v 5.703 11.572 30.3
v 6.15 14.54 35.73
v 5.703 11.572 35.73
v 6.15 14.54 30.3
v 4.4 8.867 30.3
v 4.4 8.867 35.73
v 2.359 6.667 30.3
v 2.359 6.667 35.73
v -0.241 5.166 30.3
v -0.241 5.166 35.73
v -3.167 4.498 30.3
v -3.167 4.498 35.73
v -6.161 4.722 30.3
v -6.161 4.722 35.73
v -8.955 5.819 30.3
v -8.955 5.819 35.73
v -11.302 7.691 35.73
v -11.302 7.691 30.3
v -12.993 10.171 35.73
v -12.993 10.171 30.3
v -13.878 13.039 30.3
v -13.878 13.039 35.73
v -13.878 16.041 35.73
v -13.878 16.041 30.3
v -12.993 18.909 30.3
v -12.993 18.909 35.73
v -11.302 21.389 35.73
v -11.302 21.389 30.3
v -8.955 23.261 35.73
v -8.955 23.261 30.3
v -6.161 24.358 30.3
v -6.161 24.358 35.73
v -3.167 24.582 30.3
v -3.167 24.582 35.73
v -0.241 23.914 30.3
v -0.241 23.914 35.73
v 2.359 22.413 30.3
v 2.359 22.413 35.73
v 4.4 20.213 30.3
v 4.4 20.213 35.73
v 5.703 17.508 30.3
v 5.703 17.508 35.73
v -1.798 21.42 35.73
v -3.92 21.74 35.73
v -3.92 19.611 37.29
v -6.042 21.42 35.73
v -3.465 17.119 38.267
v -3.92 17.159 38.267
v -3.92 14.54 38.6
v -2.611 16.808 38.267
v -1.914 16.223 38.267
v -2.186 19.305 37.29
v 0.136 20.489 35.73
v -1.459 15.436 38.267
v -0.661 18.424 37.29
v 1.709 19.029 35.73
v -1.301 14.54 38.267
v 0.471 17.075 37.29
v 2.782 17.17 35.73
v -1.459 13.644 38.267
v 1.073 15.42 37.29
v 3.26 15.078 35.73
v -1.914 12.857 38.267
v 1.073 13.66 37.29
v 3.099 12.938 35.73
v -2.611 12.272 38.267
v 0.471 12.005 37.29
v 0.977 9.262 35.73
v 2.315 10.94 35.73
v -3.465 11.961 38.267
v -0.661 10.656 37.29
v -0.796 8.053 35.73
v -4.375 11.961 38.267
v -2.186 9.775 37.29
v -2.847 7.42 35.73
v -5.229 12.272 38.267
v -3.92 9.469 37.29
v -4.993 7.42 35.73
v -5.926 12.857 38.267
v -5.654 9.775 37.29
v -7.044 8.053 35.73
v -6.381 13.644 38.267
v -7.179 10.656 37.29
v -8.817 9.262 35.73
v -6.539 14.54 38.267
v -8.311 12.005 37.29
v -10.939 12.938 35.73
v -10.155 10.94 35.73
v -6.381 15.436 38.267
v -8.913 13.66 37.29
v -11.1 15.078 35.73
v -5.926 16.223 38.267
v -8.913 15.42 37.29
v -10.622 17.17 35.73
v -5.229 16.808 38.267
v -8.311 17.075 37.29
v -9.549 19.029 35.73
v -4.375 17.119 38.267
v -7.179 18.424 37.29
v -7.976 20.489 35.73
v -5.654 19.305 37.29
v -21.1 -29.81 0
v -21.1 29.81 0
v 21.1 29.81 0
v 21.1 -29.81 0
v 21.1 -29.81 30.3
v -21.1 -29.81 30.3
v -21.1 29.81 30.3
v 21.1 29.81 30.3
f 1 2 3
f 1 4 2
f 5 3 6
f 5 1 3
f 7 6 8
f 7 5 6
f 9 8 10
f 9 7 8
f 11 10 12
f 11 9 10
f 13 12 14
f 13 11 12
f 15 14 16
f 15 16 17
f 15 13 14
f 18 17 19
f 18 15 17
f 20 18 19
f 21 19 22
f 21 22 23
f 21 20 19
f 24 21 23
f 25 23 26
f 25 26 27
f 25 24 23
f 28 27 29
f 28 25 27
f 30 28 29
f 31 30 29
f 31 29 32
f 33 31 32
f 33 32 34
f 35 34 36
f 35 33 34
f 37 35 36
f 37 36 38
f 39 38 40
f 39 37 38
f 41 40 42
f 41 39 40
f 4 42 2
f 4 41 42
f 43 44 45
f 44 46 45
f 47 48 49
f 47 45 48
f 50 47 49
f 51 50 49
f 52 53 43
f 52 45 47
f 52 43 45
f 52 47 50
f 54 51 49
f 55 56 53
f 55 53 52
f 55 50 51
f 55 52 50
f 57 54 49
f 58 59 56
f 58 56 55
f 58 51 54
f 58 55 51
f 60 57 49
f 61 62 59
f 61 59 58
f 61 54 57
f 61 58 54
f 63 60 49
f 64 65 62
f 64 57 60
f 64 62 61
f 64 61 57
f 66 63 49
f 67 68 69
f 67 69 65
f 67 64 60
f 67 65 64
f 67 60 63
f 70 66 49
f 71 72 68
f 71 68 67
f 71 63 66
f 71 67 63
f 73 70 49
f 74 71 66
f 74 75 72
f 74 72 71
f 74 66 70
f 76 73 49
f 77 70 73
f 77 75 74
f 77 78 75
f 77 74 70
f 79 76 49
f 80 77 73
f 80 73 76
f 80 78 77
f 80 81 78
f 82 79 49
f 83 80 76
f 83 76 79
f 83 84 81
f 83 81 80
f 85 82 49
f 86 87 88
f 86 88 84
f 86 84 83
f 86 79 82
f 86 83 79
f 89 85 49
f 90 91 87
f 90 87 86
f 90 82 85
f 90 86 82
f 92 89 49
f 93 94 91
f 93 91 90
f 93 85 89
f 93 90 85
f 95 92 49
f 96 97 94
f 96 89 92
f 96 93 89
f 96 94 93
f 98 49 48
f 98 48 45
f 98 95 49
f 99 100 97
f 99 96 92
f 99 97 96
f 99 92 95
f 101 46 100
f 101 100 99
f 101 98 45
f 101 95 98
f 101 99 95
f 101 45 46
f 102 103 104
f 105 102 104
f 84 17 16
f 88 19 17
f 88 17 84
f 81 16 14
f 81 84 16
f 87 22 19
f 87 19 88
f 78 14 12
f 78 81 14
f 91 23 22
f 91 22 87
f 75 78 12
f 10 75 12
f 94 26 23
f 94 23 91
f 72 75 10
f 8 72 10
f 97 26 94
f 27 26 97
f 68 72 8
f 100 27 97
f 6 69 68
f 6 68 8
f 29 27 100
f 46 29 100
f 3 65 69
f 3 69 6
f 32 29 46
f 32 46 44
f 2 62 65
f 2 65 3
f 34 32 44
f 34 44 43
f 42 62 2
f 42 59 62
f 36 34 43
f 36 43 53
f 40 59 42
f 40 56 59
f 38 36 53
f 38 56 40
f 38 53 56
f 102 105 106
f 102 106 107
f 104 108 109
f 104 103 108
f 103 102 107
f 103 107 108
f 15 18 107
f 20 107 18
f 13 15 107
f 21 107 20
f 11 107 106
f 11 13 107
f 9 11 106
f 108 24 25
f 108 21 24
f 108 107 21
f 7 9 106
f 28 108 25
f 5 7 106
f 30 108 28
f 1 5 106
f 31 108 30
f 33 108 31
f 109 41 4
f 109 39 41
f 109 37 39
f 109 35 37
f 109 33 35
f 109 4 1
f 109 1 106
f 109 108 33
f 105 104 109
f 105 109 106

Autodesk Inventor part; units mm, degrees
ref_plane "YZ Plane" through (0, 0, 0) normal (1, 0, 0) x (0, 1, 0)
ref_plane "XZ Plane" through (0, 0, 0) normal (0, 1, 0) x (-1, 0, 0)
sketch "Sketch1" plane through (0, 0, 0) normal (0, 0, 1) x (1, 0, 0)
  line L0 (-21.1, 29.81) -> (21.1, 29.81)
  line L1 (21.1, 29.81) -> (21.1, -29.81)
  line L2 (21.1, -29.81) -> (-21.1, -29.81)
  line L3 (-21.1, -29.81) -> (-21.1, 29.81)
  line L4 (0, 0) -> (0, 68.2086)
  line L5 (0, 0) -> (53.7664, 0)
  dimension "d0" = 59.62
  dimension "d1" = 42.2
extrude "Extrusion1" add sketch "Sketch1" along normal blind 30.3
ref_plane "Work Plane1" through (-3.92, -29.81, 0) normal (-1, 0, 0) x (0, 0, 1)
sketch "Sketch3" plane through (-3.92, -29.81, 0) normal (-1, 0, 0) x (0, 0, 1)
  line L0 (0, 59.62) -> (30.3, 59.62) projected
  line L1 (30.3, 59.62) -> (30.3, 0) projected
  line L2 (30.3, 44.35) -> (38.03, 44.35)
  line L3 (39.0073, 54.42) -> (18.3537, 54.42)
  arc A0 (30.3, 34.28) -> (30.3, 54.42) centre (27.6058, 44.35) ccw
  point P0 (0, 29.81)
  dimension "d8" = 7.73
  dimension "d9" = 15.27
  dimension "d10" = 5.2
  dimension "d11" = 20.14
revolve "Revolution1" add sketch "Sketch3" angle 360 about axis through (-3.92, 14.54, 30.3) along (0, 0, 1) picked at (31.0054, 37.9107) contours L2 A0 L1
sketch "Sketch6" plane through (0, 0, 30.3) normal (0, 0, 1) x (1, 0, 0)
  circle A0 centre (-3.92, 14.54) radius 10.07 projected
  circle A1 centre (-3.92, 14.54) radius 10.07
  point P0 (0, 0)
extrude "Extrusion4" add sketch "Sketch6" along normal blind 5.43
sketch "Sketch7" plane through (21.1, -29.81, 0) normal (1, 0, 0) x (0, 0, -1)
  line L0 (-35.73, 34.28) -> (-35.73, 54.42) projected
  line L1 (-35.73, 54.42) -> (-46.1148, 54.42)
  line L2 (-46.1148, 54.42) -> (-46.1148, 34.28)
  line L3 (-46.1148, 34.28) -> (-35.73, 34.28)
  line L4 (-35.73, 34.28) -> (-35.73, 54.42)
  point P0 (0, 29.81)
extrude "Extrusion5" cut sketch "Sketch7" against normal blind 400
sketch "Sketch8" plane through (-3.92, -29.81, 0) normal (-1, 0, 0) x (0, 0, 1)
  line L0 (35.73, 54.42) -> (35.73, 34.28) projected
  line L1 (35.73, 44.35) -> (38.6, 44.35)
  line L2 (31.2686, 37.15) -> (43.7794, 37.15)
  line L3 (30.3, 34.28) -> (35.73, 34.28) projected
  line L4 (31.2686, 51.55) -> (47.0475, 51.55)
  line L5 (30.3, 54.42) -> (35.73, 54.42) projected
  arc A0 (35.73, 37.15) -> (35.73, 51.55) centre (28.1336, 44.35) ccw
  point P0 (0, 29.81)
  dimension "d27" = 2.87
  dimension "d28" = 2.87
  dimension "d29" = 2.87
revolve "Revolution2" add sketch "Sketch8" angle 360 about axis through (-3.92, 14.54, 35.73) along (0, 0, 1) picked at (36.137, 48.6296) contours A0 L1 L0
sketch "Sketch9" plane through (-3.92, -29.81, 0) normal (-1, 0, 0) x (0, 0, 1)
  line L0 (35.73, 54.42) -> (35.73, 34.28) projected
  line L1 (30.3, 54.42) -> (30.3, 34.28) projected
  line L2 (35.73, 51.55) -> (35.73, 37.15) projected
  line L3 (31.5731, 44.35) -> (78.5809, 125.77)
  line L4 (31.5731, 44.35) -> (78.5809, -37.07)
  line L5 (30.3, 44.35) -> (31.5731, 44.35) construction
  point P0 (0, 29.81)
  point P1 (38.6, 44.35)
  dimension "d31" = 120
sketch "Sketch10" plane through (0, 0, 30.3) normal (0, 0, 1) x (1, 0, 0)
  circle A0 centre (-3.92, 14.54) radius 10.07 projected
  line L0 (21.1, 29.81) -> (21.1, -29.81) projected
  line L1 (-21.1, 29.81) -> (21.1, 29.81) projected
  line L2 (-21.1, -29.81) -> (-21.1, 29.81) projected
  line L3 (21.1, -29.81) -> (-21.1, -29.81) projected
  point P0 (0, 0)
properties part number "Camera" material "PVC-Piping"
